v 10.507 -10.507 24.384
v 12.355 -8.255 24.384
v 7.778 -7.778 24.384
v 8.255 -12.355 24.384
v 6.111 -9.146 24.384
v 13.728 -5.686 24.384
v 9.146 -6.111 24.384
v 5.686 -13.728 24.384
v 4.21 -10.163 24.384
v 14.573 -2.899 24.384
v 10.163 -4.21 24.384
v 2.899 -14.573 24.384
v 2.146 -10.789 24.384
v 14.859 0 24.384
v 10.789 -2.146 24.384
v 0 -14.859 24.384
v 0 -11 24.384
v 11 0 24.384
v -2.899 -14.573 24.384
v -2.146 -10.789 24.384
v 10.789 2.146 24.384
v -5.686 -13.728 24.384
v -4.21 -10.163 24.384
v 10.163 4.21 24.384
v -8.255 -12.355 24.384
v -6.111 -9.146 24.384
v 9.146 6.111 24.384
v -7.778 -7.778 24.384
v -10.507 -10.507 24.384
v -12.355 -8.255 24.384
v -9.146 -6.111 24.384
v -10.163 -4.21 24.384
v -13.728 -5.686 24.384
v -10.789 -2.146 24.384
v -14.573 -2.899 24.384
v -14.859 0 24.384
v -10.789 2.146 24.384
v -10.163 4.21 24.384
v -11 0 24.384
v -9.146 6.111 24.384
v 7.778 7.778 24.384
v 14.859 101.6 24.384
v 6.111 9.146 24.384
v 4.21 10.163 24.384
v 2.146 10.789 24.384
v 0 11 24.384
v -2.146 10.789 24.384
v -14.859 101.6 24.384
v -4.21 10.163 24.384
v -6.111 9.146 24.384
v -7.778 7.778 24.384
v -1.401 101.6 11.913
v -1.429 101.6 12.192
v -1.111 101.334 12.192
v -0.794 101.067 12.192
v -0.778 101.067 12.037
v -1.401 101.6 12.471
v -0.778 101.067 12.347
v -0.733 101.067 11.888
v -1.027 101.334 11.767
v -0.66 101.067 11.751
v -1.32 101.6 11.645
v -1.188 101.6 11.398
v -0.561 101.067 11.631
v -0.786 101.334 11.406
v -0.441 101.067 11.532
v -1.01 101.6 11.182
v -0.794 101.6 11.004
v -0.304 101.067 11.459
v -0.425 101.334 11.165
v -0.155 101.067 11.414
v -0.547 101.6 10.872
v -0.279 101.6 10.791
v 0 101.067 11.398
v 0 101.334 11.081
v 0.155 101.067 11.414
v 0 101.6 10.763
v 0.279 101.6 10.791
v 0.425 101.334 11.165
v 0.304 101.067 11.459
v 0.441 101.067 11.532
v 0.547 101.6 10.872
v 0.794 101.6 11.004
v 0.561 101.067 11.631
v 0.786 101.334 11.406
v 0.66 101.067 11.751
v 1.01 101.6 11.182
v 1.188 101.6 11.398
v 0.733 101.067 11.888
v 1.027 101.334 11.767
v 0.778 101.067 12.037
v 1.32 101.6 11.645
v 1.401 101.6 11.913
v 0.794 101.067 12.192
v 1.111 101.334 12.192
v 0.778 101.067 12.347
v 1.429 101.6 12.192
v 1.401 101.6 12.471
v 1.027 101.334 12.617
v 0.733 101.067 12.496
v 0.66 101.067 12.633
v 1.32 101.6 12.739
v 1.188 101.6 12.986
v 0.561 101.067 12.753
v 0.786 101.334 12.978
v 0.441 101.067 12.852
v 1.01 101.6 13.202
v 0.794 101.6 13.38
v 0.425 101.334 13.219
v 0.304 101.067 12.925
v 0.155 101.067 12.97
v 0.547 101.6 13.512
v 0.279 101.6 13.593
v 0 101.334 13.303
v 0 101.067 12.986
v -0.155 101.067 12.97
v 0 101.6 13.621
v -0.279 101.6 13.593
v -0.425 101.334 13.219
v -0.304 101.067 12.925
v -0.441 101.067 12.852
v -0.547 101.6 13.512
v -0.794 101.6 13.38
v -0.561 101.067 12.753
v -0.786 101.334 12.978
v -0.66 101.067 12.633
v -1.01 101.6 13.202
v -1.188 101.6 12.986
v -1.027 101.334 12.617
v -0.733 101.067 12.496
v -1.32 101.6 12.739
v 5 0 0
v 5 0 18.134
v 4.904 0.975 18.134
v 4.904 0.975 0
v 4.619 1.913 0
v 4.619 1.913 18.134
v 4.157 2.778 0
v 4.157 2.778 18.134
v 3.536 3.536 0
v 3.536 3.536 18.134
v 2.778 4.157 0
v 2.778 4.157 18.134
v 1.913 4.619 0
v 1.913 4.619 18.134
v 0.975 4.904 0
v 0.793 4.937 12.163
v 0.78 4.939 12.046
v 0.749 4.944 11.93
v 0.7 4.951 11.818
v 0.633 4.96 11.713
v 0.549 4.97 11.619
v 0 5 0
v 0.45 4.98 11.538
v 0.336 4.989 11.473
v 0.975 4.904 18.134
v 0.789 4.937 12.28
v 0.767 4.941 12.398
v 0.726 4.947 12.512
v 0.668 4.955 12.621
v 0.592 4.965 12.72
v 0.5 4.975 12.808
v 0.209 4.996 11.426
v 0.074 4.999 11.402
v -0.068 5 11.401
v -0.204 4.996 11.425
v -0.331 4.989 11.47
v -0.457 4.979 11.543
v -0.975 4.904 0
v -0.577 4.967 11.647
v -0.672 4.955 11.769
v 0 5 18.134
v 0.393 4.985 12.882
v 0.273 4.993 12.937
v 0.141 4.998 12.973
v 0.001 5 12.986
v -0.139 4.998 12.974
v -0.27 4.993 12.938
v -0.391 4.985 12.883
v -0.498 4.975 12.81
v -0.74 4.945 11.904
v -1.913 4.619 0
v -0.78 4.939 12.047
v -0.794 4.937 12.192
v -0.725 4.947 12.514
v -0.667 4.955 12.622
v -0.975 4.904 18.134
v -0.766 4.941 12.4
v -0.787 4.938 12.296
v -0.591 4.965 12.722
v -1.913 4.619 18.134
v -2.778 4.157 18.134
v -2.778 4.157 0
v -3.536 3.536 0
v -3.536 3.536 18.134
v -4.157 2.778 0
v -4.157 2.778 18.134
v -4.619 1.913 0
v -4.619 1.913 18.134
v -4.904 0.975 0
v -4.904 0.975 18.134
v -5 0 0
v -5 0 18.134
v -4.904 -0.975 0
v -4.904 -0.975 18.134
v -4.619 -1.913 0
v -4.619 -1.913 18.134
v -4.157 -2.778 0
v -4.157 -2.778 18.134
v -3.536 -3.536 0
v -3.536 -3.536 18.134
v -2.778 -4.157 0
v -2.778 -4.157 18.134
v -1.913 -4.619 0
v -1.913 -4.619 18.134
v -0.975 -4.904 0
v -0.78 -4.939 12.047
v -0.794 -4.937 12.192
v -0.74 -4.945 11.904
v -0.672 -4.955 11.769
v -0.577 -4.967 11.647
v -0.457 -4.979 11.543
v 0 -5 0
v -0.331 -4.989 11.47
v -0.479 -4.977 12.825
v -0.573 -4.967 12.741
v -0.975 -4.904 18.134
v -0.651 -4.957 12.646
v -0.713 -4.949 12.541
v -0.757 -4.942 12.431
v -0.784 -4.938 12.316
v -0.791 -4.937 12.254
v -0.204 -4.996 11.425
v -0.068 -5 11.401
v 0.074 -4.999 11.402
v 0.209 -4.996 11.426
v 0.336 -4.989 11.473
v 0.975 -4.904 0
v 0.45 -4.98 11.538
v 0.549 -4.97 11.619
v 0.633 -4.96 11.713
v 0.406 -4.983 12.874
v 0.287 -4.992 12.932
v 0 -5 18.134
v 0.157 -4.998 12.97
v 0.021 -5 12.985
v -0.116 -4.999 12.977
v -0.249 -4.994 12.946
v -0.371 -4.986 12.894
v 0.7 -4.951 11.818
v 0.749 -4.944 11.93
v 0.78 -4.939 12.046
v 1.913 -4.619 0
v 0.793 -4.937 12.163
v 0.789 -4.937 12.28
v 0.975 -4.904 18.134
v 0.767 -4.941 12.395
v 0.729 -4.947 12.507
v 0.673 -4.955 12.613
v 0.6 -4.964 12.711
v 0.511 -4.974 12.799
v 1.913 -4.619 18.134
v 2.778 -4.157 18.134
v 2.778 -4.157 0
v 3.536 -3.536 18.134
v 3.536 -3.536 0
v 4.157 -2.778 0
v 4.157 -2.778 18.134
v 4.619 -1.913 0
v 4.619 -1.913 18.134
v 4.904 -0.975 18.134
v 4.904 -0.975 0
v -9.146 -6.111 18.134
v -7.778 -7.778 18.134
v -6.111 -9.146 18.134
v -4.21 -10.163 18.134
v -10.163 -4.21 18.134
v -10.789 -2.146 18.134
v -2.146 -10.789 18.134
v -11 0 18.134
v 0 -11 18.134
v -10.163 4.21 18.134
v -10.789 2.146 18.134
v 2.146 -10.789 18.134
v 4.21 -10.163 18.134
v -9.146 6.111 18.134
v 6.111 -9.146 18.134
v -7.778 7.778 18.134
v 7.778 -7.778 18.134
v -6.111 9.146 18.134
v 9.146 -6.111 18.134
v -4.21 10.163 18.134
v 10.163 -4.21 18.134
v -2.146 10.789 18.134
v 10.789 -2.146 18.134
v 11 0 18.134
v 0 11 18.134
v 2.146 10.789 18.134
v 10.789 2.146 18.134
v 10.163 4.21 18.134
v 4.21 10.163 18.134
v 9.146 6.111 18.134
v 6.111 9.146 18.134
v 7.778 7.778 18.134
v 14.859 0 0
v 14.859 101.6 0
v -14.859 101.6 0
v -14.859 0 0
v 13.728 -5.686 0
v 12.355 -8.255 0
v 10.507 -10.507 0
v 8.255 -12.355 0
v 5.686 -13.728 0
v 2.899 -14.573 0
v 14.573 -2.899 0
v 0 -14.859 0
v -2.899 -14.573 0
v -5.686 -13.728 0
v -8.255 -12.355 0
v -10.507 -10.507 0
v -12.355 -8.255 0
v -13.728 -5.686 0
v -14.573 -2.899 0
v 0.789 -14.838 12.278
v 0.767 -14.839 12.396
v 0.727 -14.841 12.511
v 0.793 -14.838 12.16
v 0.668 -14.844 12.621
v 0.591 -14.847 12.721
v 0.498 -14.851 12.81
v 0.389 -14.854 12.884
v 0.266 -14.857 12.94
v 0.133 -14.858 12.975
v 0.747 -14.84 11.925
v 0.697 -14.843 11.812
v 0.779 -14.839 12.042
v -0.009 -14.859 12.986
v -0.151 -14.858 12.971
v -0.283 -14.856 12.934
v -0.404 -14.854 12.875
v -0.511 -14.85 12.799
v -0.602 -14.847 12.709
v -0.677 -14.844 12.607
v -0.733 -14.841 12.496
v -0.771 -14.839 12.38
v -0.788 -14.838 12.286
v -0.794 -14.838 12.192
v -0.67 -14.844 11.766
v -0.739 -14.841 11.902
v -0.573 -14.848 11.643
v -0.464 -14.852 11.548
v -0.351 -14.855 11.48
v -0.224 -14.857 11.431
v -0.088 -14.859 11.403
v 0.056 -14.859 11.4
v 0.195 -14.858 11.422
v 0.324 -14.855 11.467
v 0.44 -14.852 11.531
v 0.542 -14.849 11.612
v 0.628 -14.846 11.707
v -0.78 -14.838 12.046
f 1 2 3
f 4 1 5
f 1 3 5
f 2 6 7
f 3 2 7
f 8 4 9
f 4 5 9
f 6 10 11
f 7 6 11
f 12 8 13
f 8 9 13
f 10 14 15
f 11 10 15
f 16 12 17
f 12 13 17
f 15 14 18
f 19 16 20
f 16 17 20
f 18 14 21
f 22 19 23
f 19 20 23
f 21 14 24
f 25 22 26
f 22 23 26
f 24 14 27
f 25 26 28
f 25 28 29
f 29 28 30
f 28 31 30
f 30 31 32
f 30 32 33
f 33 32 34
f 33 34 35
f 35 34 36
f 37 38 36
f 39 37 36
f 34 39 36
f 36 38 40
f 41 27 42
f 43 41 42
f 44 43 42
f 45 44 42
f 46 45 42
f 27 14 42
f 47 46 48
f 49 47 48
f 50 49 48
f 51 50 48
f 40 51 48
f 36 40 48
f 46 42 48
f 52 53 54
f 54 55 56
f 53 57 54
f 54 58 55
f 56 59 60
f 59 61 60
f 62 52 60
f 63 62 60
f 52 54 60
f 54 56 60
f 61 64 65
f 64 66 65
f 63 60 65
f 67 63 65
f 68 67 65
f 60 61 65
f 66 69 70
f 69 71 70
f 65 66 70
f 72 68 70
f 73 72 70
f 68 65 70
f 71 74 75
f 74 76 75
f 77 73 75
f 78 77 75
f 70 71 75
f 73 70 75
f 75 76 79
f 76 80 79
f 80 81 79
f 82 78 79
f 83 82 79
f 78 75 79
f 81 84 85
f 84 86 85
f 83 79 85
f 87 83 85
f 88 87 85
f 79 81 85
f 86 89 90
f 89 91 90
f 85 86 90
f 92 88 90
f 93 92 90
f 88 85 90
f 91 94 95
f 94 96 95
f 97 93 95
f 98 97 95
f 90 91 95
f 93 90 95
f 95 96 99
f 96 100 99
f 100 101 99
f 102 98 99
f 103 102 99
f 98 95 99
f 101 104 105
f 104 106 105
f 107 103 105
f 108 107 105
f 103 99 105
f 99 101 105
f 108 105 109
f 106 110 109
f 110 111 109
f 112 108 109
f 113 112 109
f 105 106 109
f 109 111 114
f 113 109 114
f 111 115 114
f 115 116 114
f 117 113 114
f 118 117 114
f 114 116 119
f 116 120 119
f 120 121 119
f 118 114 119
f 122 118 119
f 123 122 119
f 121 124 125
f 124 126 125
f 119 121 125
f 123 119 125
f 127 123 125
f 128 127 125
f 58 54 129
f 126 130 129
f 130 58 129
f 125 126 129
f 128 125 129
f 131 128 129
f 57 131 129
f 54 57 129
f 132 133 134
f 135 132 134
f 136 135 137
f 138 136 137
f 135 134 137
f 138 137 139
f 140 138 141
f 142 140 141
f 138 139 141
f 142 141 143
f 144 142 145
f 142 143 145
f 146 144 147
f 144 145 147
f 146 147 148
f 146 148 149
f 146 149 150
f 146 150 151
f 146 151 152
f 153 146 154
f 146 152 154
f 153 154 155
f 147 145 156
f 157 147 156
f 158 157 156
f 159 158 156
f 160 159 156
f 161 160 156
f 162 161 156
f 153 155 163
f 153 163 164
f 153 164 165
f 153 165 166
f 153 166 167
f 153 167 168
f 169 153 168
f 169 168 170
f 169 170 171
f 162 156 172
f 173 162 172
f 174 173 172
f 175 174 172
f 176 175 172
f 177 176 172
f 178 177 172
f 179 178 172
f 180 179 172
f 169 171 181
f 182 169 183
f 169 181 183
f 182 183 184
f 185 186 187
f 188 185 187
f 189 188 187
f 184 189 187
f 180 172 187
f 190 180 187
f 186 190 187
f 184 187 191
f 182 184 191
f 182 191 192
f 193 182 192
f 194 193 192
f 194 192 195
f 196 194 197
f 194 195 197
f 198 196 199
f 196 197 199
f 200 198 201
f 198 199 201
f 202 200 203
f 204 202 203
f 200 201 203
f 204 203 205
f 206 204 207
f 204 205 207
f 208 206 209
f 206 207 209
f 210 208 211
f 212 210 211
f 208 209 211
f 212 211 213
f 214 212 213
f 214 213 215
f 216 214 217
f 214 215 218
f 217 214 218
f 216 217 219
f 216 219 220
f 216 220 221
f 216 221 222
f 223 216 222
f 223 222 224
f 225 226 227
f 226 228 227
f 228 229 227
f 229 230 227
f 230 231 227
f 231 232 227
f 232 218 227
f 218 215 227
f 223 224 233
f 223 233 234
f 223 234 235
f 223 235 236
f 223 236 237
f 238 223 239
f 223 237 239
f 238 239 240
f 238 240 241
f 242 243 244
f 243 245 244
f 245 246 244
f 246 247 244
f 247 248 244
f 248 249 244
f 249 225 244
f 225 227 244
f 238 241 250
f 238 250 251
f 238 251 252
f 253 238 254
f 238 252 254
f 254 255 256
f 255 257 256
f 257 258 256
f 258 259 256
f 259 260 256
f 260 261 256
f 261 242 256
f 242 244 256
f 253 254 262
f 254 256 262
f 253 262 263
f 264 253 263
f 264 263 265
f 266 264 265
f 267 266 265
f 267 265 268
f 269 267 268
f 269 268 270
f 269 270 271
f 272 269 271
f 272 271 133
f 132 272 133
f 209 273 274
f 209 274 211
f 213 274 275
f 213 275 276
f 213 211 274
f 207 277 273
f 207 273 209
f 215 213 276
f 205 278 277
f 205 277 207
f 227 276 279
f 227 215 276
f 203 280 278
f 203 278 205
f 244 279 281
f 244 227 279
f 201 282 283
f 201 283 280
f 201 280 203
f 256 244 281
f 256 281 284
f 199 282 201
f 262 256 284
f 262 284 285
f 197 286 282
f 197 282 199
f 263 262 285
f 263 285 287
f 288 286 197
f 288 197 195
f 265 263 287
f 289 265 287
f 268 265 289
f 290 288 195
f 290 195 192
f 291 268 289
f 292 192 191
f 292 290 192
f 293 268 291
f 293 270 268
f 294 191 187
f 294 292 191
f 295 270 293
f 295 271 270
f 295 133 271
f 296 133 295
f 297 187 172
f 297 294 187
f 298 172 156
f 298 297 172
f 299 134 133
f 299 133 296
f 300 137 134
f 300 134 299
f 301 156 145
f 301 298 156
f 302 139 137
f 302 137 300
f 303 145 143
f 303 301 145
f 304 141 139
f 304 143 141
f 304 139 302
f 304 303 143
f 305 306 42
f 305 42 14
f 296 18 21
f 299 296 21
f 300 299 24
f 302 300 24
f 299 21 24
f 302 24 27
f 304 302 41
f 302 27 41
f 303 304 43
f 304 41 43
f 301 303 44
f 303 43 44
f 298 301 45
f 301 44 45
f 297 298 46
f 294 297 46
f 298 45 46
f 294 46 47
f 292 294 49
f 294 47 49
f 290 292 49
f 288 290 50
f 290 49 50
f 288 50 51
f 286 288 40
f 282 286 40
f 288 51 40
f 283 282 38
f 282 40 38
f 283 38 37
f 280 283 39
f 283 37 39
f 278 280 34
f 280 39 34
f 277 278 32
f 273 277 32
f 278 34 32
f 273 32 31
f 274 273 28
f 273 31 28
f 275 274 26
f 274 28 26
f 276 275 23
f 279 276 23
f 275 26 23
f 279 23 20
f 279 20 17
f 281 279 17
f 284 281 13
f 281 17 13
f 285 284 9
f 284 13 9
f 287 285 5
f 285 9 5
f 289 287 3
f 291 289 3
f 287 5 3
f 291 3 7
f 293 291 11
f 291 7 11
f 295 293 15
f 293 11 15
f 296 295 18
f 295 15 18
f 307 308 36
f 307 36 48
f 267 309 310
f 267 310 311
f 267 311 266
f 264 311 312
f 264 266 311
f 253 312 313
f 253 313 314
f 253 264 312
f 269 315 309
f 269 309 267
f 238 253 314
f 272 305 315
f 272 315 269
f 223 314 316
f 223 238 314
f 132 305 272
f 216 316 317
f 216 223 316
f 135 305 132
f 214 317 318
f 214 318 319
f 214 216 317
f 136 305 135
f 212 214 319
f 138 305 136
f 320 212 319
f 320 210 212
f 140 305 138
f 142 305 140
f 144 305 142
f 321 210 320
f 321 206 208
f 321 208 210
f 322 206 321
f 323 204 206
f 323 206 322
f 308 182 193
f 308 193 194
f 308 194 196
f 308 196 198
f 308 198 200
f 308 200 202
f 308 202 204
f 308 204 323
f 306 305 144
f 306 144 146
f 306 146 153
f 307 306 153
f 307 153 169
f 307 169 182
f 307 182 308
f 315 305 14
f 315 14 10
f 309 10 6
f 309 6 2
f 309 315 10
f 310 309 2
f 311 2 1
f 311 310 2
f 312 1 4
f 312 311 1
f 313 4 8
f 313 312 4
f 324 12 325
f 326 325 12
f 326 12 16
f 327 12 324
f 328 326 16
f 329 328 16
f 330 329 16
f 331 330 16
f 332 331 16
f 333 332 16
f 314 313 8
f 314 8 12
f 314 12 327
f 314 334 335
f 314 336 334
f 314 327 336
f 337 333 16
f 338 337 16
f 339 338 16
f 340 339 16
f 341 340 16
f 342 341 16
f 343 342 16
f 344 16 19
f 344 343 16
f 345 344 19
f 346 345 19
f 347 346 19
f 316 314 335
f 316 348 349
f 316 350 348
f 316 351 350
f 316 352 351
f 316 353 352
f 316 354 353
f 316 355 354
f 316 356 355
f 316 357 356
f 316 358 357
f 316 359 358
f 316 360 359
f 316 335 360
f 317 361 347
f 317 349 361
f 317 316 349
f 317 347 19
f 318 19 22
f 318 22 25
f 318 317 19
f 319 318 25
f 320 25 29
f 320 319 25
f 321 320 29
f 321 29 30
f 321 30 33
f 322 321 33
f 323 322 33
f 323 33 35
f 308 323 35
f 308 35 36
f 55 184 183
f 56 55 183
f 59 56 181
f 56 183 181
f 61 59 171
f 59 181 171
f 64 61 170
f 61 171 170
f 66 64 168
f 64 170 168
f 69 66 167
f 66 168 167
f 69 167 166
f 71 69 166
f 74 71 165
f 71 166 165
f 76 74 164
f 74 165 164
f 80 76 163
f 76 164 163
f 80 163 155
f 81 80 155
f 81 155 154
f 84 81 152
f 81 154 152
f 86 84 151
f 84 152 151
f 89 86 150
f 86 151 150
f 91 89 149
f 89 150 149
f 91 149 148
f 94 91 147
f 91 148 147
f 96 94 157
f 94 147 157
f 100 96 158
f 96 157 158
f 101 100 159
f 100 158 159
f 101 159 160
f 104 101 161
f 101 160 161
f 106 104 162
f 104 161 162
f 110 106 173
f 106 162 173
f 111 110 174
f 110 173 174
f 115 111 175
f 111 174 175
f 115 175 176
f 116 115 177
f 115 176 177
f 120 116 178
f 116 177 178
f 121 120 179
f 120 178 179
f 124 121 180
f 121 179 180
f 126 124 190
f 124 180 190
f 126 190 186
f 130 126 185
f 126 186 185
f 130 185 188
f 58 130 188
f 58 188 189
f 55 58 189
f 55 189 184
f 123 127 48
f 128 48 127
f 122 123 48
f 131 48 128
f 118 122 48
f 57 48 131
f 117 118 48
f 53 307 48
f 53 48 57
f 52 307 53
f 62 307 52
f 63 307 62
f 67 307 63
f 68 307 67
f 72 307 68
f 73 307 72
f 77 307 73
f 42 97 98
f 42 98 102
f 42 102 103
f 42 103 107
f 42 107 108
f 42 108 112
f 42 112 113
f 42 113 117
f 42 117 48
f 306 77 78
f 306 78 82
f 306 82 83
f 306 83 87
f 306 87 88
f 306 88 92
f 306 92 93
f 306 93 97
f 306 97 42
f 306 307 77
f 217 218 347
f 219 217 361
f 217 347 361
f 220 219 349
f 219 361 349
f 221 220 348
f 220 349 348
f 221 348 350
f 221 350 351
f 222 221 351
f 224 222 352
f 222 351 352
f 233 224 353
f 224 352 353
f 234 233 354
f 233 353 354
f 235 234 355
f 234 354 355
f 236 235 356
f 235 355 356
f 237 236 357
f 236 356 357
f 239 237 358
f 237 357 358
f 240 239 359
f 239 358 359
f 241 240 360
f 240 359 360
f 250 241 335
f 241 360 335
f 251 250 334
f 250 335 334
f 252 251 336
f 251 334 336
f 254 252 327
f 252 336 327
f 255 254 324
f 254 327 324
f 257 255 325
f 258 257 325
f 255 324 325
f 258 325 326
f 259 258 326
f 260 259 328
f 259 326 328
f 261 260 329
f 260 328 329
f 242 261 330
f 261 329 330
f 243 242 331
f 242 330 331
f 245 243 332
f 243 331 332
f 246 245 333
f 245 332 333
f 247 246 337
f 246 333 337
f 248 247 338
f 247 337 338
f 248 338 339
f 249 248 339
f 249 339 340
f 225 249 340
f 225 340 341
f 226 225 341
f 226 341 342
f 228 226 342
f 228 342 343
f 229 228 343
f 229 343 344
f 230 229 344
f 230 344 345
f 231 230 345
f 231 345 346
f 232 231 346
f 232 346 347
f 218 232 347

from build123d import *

# Parameters (mm, degrees)
BOSS_EXTRUDE1_DEPTH                   = 24.384
F_1_16_0_0625_DOWEL_HOLE1_D           = 1.5875
F_1_16_0_0625_DOWEL_HOLE1_CSINK_D     = 2.8575
F_1_16_0_0625_DOWEL_HOLE1_CSINK_ANGLE = 100
SKETCH7_R                             = 11
CUT_EXTRUDE1_DEPTH                    = 6.25
SKETCH8_R                             = 5
CUT_EXTRUDE2_DEPTH                    = 33


with BuildPart() as part:
    # Sketch1 → Boss-Extrude1 (new body)
    with BuildSketch(Plane.XY):
        with BuildLine():
            Line((-14.859, 0), (-14.859, 101.6))
            Line((-14.859, 101.6), (14.859, 101.6))
            Line((14.859, 101.6), (14.859, 0))
            ThreePointArc((14.859, 0), (0, -14.859), (-14.859, 0))
        make_face()
    extrude(amount=BOSS_EXTRUDE1_DEPTH)

    # 1/16 (0.0625) Dowel Hole1 (through all)
    with Locations(Plane(origin=(0, 101.6, 0), x_dir=(1, 0, 0), z_dir=(0, 1, 0))):
        with Locations((0, -12.192)):
            CounterSinkHole(F_1_16_0_0625_DOWEL_HOLE1_D / 2, F_1_16_0_0625_DOWEL_HOLE1_CSINK_D / 2, counter_sink_angle=F_1_16_0_0625_DOWEL_HOLE1_CSINK_ANGLE)

    # Sketch7 → Cut-Extrude1 (cut)
    with BuildSketch(Plane.XY.offset(24.384)):
        Circle(SKETCH7_R)
    extrude(amount=-CUT_EXTRUDE1_DEPTH, mode=Mode.SUBTRACT)

    # Sketch8 → Cut-Extrude2 (cut)
    with BuildSketch(Plane.XY.offset(18.134)):
        Circle(SKETCH8_R)
    extrude(amount=-CUT_EXTRUDE2_DEPTH, mode=Mode.SUBTRACT)


solid = part.part
